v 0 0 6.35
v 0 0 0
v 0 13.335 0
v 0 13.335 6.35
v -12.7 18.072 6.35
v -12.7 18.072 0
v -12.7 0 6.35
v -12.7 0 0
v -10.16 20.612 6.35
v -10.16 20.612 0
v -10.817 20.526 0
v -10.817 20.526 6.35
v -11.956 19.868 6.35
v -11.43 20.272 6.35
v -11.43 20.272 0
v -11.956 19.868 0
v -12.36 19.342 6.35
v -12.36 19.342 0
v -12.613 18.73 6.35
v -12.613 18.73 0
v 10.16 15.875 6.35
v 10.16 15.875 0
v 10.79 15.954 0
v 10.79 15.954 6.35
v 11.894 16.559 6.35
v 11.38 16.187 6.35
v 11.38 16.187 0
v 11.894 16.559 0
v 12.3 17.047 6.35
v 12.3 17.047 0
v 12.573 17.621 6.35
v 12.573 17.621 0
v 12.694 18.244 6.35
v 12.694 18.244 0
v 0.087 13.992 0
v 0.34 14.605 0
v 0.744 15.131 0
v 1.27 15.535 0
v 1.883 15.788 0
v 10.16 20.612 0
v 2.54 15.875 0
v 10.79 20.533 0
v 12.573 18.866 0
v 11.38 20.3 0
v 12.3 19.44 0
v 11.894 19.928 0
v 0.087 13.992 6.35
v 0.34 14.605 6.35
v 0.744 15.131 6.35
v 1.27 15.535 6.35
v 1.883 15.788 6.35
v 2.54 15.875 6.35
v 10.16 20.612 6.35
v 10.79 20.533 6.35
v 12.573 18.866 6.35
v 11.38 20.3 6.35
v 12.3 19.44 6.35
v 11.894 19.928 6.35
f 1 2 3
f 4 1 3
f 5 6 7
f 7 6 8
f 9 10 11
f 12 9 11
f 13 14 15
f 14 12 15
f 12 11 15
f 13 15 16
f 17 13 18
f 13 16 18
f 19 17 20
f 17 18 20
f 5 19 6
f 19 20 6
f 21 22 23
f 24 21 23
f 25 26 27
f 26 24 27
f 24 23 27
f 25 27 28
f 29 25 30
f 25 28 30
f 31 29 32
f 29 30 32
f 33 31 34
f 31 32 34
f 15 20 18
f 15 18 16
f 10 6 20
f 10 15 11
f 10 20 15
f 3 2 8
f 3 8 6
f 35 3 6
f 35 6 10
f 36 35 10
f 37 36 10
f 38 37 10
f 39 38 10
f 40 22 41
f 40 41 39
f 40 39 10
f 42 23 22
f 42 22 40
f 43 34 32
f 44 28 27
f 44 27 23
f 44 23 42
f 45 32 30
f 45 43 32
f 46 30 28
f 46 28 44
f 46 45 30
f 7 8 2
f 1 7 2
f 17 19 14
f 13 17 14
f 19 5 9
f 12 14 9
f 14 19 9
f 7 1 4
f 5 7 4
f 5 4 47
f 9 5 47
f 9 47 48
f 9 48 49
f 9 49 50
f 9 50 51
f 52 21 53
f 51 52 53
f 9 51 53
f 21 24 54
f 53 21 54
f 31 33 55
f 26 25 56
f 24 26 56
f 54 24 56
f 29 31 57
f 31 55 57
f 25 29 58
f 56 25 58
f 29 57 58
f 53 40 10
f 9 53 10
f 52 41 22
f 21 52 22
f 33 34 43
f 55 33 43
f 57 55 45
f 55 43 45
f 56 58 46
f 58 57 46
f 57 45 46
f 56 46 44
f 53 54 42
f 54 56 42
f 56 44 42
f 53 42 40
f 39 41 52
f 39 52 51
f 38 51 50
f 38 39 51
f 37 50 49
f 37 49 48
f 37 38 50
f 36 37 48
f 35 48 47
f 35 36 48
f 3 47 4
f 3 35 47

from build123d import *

# Parameters (mm, degrees)
BOSS_EXTRUDE1_DEPTH = 6.35
FILLET1_R           = 2.54


with BuildPart() as part:
    # Sketch1 → Boss-Extrude1 (new body)
    with BuildSketch(Plane.XY):
        Polygon((0, 0), (0, 15.875), (12.7, 15.875), (12.7, 20.6121), (-12.7, 20.6121), (-12.7, 0), align=None)
    extrude(amount=BOSS_EXTRUDE1_DEPTH)

    # Fillet1
    # the kernel refuses this fillet: 2.54 mm, written as the material it adds along each edge
    with BuildSketch(Plane(origin=(0, 15.875, 0), x_dir=(0, -1, 0), z_dir=(0, 0, 1))) as fillet1_piece_1:
        with BuildLine():
            CenterArc((FILLET1_R, FILLET1_R), FILLET1_R, 180, 90)
            Line((0, FILLET1_R), (0, 0))
            Line((0, 0), (FILLET1_R, 0))
        make_face()
    extrude(amount=6.35)
    # the kernel refuses this fillet: 2.54 mm, written as the material it takes off along each edge
    with BuildSketch(Plane(origin=(12.7, 15.875, -6.35), x_dir=(-1, 0, 0), z_dir=(0, 0, 1)), Plane(origin=(12.7, 20.6121, -6.35), x_dir=(0, -1, 0), z_dir=(0, 0, 1)), Plane(origin=(-12.7, 20.6121, -6.35), x_dir=(1, 0, 0), z_dir=(0, 0, 1))) as fillet1_2_piece_1:
        with BuildLine():
            CenterArc((FILLET1_R, -FILLET1_R), FILLET1_R, 90, 90)
            Line((0, -FILLET1_R), (0, 0))
            Line((0, 0), (FILLET1_R, 0))
        make_face()
    extrude(amount=19.05, mode=Mode.SUBTRACT)


solid = part.part
